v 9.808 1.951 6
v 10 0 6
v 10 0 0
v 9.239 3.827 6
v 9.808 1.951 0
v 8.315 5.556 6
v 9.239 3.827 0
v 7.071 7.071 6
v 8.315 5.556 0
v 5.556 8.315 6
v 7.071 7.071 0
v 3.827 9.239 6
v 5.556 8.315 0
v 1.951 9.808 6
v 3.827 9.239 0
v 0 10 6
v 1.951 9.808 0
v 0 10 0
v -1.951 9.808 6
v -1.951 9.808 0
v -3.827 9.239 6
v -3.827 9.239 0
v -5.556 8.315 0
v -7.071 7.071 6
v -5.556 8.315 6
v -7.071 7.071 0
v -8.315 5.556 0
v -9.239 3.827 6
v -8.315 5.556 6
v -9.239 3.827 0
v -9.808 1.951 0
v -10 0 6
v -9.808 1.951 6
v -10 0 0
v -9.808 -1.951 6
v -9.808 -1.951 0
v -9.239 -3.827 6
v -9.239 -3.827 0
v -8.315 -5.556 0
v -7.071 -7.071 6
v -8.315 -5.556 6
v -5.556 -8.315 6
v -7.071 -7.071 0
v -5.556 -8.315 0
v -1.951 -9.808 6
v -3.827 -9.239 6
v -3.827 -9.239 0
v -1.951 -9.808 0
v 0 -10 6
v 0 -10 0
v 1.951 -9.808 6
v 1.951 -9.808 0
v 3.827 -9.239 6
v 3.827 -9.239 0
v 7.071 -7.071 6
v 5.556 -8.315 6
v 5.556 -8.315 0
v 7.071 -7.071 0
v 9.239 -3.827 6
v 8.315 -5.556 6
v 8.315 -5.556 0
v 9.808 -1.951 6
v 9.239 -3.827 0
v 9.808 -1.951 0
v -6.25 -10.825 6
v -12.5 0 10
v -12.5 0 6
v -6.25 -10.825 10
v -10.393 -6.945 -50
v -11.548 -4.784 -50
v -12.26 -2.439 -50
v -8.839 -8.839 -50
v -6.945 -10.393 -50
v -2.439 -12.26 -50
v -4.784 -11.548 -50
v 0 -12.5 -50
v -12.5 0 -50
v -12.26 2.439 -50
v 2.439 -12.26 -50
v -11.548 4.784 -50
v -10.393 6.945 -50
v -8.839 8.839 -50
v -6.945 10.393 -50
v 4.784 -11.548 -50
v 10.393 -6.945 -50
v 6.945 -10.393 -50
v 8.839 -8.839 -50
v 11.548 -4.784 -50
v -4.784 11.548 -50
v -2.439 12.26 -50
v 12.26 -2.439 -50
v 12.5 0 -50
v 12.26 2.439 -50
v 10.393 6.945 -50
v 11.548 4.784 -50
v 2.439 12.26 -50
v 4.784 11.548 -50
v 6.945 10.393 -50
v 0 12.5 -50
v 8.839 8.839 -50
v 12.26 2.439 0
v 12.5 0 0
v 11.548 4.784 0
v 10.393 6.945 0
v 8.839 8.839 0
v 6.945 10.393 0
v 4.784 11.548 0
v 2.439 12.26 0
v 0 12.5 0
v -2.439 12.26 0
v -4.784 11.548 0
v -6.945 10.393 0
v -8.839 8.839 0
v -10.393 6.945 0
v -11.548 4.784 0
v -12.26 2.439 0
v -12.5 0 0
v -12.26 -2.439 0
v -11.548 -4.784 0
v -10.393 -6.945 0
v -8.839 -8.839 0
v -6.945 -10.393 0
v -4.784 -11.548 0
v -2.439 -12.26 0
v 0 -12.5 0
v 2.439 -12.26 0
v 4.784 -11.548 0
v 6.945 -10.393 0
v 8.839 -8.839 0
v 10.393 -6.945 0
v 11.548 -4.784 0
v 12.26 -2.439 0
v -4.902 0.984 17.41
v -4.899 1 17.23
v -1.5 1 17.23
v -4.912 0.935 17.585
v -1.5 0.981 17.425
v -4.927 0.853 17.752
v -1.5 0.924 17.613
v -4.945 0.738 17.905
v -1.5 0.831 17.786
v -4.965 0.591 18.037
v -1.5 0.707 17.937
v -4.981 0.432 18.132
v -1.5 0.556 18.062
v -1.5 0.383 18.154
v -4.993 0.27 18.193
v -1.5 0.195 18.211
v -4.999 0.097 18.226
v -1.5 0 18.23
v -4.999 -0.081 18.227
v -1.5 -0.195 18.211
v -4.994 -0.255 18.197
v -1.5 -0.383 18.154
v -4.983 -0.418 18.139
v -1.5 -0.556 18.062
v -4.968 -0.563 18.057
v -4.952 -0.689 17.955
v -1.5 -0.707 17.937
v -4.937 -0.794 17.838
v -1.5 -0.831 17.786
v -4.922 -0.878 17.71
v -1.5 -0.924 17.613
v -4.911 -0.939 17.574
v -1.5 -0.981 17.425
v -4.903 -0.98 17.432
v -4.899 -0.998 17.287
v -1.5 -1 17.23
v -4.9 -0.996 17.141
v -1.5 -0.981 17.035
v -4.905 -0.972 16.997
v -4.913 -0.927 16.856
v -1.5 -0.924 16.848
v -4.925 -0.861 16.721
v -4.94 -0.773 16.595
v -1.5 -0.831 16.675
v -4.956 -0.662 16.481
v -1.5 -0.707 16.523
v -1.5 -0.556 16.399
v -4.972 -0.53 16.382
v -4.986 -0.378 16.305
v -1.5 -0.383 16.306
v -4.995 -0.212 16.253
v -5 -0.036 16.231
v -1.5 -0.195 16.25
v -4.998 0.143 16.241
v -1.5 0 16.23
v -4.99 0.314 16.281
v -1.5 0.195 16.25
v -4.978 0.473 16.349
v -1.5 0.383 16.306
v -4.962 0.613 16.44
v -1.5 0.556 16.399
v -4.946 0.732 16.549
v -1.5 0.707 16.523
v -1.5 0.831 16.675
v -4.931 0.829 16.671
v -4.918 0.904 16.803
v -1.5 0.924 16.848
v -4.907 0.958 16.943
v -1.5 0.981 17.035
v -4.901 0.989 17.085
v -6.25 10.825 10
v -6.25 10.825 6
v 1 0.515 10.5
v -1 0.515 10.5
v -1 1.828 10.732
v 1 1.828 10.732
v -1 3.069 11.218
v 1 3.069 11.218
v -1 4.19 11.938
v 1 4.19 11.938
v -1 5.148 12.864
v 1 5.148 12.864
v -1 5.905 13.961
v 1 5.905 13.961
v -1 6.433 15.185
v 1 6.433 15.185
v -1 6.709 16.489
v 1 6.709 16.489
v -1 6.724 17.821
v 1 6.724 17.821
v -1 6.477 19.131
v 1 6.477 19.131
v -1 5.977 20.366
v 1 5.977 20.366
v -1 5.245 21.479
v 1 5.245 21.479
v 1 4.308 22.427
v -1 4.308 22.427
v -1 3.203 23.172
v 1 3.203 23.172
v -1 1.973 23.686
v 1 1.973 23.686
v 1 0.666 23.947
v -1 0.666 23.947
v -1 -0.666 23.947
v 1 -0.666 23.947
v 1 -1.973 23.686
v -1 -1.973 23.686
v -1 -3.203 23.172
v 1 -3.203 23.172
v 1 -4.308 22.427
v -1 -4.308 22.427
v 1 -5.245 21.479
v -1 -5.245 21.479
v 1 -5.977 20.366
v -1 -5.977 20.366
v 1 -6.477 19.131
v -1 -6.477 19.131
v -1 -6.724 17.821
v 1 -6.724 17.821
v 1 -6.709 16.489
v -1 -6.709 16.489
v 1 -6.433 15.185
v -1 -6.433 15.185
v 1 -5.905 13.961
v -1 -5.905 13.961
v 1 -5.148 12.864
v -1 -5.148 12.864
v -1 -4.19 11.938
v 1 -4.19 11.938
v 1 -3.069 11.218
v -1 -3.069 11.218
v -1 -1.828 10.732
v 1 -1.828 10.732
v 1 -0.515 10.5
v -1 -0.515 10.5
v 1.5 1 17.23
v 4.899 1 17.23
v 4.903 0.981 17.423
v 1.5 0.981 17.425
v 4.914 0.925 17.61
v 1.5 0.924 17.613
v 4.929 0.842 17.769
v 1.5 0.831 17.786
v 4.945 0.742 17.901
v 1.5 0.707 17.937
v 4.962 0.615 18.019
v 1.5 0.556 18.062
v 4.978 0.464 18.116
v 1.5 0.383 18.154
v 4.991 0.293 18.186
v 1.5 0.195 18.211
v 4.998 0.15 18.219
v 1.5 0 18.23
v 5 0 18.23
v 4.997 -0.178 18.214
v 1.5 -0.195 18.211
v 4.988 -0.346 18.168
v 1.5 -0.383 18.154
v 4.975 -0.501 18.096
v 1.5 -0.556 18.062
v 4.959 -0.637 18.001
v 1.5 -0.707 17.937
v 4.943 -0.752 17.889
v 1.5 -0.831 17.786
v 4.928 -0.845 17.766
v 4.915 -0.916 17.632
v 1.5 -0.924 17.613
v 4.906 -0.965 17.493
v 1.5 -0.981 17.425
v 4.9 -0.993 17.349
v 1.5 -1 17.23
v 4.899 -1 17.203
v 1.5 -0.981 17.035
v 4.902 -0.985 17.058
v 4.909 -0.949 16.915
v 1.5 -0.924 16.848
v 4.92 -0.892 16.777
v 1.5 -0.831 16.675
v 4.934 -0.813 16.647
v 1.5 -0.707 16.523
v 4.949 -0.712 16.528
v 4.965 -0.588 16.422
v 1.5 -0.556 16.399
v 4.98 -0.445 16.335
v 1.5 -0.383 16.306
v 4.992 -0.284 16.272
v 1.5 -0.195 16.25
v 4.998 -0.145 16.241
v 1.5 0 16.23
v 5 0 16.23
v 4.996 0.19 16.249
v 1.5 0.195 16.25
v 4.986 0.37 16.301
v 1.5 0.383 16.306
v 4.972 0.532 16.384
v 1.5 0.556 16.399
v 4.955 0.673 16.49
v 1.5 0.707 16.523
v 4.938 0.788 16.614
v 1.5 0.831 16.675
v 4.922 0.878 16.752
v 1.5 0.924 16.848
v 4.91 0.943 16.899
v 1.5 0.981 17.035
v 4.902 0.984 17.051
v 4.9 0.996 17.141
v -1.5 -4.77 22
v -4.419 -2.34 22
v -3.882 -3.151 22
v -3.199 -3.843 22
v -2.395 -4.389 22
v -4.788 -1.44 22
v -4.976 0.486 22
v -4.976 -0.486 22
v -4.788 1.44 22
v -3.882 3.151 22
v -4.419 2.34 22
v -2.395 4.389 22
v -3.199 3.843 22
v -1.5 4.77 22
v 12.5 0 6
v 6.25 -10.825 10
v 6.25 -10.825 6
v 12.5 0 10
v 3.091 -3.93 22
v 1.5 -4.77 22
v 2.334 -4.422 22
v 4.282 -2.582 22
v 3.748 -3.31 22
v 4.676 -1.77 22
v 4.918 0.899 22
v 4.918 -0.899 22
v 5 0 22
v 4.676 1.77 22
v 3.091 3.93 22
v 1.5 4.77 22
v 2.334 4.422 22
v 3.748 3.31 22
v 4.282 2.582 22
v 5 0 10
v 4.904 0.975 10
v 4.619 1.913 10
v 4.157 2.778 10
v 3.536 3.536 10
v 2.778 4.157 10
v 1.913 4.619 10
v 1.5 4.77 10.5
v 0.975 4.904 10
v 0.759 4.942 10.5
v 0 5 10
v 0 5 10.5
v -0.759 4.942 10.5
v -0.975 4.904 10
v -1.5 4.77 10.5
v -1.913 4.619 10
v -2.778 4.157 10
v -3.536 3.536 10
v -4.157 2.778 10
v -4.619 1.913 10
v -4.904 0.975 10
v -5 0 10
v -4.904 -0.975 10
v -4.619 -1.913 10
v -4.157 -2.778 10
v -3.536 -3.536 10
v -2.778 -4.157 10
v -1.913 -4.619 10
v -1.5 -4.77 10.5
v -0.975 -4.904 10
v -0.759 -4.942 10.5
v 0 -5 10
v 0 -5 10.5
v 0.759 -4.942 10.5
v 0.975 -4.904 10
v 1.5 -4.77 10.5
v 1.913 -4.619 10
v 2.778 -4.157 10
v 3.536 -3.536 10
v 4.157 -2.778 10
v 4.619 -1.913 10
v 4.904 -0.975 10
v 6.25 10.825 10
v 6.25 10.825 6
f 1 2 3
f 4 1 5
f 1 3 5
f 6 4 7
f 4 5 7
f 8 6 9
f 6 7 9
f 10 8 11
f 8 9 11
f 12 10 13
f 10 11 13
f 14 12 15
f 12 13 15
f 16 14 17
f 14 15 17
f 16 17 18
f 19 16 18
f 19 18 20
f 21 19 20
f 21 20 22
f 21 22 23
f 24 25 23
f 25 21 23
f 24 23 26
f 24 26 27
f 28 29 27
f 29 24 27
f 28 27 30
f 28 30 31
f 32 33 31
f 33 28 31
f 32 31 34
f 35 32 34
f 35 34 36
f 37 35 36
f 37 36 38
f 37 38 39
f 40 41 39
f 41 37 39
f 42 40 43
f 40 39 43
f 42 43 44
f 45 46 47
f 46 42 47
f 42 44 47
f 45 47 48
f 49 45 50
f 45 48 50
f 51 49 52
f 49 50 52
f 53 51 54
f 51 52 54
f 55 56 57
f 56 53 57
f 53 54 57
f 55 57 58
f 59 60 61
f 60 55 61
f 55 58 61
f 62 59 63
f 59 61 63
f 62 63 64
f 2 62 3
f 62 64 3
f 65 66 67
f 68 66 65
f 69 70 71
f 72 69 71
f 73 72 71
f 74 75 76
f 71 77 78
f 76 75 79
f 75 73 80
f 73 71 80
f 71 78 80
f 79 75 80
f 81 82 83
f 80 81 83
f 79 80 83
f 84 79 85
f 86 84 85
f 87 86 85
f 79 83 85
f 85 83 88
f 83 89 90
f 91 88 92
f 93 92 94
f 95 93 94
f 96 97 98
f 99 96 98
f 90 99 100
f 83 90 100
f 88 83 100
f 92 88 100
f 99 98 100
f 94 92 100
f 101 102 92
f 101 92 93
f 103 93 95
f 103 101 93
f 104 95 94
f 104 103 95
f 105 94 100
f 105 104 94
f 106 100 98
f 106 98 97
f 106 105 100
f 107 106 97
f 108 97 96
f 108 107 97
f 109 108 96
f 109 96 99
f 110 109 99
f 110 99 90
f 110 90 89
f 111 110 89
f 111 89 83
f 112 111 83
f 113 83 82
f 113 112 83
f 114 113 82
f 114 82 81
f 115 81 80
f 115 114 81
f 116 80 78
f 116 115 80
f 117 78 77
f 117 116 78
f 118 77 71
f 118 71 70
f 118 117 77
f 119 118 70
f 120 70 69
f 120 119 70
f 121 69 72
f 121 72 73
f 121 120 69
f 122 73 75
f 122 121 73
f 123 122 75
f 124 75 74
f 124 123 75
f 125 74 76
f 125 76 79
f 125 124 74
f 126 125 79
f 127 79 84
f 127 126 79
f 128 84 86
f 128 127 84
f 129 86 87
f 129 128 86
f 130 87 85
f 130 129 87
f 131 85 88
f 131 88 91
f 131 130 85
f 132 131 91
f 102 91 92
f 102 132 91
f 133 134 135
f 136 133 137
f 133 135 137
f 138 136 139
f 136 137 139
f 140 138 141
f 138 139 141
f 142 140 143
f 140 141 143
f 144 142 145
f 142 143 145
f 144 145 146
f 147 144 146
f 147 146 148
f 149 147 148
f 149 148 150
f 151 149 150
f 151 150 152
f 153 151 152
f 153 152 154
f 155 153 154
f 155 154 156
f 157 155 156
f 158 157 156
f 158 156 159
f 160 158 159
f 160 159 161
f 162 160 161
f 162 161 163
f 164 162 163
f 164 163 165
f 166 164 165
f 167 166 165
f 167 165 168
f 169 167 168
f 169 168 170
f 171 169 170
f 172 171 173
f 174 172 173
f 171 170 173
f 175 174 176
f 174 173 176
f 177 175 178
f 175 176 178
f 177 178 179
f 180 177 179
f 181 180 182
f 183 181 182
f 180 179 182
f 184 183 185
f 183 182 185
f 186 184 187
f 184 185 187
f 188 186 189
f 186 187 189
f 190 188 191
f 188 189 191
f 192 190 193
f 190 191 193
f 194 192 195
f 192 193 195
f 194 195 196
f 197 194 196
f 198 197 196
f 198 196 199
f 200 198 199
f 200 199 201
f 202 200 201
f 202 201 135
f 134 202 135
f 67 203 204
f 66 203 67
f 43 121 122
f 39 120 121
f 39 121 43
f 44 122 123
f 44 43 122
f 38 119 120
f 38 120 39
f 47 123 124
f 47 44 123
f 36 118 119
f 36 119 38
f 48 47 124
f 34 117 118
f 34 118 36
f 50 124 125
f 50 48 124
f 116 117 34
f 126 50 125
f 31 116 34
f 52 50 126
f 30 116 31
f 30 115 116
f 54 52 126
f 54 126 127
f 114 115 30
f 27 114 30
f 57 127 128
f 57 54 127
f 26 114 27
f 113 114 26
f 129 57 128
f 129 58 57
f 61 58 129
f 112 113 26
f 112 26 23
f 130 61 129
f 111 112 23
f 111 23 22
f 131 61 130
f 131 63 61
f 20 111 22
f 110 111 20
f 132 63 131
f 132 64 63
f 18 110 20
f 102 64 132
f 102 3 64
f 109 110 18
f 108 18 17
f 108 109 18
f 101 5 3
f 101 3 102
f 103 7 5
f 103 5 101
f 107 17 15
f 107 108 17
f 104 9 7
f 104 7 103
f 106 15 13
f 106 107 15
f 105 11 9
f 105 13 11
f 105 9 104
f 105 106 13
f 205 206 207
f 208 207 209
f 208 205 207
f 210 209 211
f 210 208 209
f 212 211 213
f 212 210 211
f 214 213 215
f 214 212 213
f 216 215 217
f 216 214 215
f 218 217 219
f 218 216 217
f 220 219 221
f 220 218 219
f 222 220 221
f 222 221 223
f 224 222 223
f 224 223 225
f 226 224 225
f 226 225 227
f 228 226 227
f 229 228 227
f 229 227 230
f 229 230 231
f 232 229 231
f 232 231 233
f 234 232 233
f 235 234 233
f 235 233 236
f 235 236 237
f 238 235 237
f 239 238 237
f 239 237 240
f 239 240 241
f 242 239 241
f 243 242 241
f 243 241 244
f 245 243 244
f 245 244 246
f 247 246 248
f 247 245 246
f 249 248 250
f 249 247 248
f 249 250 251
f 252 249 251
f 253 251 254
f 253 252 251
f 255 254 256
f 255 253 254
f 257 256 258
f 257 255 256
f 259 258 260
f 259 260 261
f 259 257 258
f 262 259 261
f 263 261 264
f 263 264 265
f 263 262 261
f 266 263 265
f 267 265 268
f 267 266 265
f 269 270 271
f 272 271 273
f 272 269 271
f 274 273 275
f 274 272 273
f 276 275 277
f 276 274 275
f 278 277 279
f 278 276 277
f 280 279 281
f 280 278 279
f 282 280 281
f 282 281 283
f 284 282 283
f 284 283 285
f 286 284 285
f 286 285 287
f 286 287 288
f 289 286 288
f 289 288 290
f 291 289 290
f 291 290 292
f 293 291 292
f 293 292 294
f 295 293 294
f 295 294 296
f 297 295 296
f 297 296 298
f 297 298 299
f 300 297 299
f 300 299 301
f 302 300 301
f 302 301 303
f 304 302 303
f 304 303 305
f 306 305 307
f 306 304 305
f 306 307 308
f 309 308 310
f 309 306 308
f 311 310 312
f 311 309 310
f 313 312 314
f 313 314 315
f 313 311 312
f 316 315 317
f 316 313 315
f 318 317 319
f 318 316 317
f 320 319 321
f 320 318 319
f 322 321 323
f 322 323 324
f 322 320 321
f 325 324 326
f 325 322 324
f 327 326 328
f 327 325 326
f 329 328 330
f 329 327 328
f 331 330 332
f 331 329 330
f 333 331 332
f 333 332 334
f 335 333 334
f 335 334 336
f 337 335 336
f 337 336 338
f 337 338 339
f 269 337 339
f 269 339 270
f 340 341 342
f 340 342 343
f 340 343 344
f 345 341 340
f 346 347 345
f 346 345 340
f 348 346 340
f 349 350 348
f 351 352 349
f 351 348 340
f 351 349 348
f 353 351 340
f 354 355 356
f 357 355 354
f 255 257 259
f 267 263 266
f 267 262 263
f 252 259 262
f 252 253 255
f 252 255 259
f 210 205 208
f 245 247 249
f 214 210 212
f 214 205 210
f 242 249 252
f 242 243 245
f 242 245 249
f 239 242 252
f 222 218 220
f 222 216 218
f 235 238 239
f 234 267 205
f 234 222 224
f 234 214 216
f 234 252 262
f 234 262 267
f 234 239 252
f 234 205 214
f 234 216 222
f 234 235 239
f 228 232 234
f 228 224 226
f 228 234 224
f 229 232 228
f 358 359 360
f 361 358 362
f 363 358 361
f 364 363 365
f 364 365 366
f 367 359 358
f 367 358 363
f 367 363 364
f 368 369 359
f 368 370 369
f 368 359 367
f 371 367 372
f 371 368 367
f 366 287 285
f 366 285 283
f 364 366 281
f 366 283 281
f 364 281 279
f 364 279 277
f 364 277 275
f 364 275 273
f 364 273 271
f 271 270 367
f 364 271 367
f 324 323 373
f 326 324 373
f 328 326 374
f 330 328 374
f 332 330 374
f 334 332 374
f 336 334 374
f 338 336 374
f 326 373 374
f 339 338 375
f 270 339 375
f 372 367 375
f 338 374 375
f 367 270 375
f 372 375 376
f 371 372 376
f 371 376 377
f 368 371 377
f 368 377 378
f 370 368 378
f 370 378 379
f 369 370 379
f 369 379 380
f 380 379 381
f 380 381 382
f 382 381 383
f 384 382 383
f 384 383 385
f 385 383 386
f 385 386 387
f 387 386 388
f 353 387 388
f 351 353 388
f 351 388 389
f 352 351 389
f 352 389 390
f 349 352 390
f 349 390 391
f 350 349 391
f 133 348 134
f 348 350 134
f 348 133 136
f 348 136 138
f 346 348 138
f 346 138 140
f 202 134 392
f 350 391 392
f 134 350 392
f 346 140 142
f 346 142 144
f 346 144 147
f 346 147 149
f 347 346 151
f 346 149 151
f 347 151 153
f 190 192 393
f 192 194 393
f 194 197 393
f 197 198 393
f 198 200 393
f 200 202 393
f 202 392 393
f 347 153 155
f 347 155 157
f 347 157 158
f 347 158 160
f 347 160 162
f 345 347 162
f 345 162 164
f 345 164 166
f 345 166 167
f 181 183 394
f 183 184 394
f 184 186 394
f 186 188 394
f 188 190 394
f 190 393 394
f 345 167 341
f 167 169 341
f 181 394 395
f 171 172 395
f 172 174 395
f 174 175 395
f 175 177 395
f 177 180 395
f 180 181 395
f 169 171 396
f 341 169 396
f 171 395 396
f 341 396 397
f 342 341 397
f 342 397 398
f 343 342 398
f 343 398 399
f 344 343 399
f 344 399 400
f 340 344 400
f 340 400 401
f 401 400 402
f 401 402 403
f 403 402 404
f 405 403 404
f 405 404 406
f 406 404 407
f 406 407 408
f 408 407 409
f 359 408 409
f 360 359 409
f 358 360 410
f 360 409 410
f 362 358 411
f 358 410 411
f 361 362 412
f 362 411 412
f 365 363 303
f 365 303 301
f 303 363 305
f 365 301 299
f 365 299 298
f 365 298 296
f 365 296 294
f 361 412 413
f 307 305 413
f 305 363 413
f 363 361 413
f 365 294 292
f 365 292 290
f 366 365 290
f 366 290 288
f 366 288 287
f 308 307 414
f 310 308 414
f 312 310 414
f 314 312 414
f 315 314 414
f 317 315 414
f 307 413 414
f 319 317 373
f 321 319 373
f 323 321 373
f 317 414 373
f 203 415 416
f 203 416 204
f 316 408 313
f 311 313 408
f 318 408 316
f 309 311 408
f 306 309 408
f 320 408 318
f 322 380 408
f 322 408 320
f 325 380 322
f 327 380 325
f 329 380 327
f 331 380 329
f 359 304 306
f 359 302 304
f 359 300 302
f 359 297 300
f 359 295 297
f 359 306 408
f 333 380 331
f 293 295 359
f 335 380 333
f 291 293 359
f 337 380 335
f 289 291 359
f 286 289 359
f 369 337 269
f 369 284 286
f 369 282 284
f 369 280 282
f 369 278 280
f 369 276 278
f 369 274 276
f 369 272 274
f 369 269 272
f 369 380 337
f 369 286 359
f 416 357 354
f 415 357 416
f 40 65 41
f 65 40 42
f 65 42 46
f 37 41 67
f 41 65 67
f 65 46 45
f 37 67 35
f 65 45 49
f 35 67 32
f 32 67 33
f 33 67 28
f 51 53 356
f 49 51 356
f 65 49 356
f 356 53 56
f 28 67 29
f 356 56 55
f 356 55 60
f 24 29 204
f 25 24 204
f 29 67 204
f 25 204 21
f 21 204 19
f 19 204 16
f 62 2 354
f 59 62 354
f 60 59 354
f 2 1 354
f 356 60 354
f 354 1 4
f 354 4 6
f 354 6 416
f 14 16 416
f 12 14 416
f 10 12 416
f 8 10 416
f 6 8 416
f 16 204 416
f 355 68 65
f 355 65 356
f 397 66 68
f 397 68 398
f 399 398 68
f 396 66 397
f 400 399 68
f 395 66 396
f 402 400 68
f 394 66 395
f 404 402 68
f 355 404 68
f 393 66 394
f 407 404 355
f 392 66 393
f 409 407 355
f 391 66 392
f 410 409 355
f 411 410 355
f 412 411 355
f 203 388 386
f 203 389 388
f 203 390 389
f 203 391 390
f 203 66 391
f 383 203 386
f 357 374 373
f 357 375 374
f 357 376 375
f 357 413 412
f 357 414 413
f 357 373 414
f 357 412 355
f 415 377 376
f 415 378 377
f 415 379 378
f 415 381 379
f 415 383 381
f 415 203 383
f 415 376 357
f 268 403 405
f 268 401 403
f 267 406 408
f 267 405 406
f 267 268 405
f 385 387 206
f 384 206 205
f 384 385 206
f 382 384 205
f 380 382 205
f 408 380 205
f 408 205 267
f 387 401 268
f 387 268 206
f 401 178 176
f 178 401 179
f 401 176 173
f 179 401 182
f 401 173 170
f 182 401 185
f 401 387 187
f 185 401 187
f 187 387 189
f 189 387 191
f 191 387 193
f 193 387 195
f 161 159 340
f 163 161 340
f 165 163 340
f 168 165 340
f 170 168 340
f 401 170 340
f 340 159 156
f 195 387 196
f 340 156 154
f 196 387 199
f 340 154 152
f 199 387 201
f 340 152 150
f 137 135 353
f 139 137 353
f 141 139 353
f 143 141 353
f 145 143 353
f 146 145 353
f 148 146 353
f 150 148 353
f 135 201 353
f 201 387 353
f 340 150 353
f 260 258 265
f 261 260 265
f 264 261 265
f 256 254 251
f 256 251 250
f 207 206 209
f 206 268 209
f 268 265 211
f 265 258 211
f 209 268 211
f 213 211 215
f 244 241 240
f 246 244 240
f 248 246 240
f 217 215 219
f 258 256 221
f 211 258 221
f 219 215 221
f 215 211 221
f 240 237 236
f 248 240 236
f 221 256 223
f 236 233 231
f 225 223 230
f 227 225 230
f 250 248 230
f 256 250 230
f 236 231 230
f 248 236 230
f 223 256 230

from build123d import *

# Parameters (mm, degrees)
F0_R           = 12.5
F1_DEPTH       = 50
F2_R           = 10
F3_DEPTH       = 10
F4_R           = 5
F5_DEPTH       = 12
F6_W           = 3
F6_H           = 11.5
F7_DEPTH       = 12.501
F7_DEPTH_BACK  = 12.501
F8_R           = 1
F9_DEPTH       = 14.001
F9_DEPTH_BACK  = 11.001
F11_DEPTH      = 4
F12_R          = 6.75
F13_DEPTH      = 1
F13_DEPTH_BACK = 1


with BuildPart() as f1:
    # F0 (on Top) → F1 (new body)
    with BuildSketch(Plane.XY):
        Circle(F0_R)
    extrude(amount=-F1_DEPTH)

    # F2 (on Top) → F3 (join)
    with BuildSketch(Plane.XY):
        Circle(F2_R)
    extrude(amount=F3_DEPTH)

    # F4 (on face) → F5 (join)
    with BuildSketch(Plane.XY.offset(10)):
        Circle(F4_R)
    extrude(amount=F5_DEPTH)

    # F6 (on Front) → F7 (cut, two sides)
    with BuildSketch(Plane.XZ) as f7_sk:
        with Locations((0, 16.25)):
            Rectangle(F6_W, F6_H)
    extrude(amount=-F7_DEPTH, mode=Mode.SUBTRACT)
    extrude(f7_sk.sketch, amount=F7_DEPTH_BACK, mode=Mode.SUBTRACT)

    # F8 (on face) → F9 (cut, two sides)
    with BuildSketch(Plane.YZ.offset(-1.5)) as f9_sk:
        with Locations((0, 17.2303039929)):
            Circle(F8_R)
    extrude(amount=F9_DEPTH, mode=Mode.SUBTRACT)
    extrude(f9_sk.sketch, amount=-F9_DEPTH_BACK, mode=Mode.SUBTRACT)

    # F10 (on face) → F11 (join)
    with BuildSketch(Plane.XY.offset(10)):
        Polygon((6.25, -10.8253175473), (12.5, 0), (6.25, 10.8253175473), (-6.25, 10.8253175473), (-12.5, 0), (-6.25, -10.8253175473), align=None)
    extrude(amount=-F11_DEPTH)

    # F12 (on Right) → F13 (join, two sides)
    with BuildSketch(Plane.YZ) as f13_sk:
        with Locations((0, 17.2303039929)):
            Circle(F12_R)
    extrude(amount=F13_DEPTH)
    extrude(f13_sk.sketch, amount=-F13_DEPTH_BACK)


solid = f1.part
